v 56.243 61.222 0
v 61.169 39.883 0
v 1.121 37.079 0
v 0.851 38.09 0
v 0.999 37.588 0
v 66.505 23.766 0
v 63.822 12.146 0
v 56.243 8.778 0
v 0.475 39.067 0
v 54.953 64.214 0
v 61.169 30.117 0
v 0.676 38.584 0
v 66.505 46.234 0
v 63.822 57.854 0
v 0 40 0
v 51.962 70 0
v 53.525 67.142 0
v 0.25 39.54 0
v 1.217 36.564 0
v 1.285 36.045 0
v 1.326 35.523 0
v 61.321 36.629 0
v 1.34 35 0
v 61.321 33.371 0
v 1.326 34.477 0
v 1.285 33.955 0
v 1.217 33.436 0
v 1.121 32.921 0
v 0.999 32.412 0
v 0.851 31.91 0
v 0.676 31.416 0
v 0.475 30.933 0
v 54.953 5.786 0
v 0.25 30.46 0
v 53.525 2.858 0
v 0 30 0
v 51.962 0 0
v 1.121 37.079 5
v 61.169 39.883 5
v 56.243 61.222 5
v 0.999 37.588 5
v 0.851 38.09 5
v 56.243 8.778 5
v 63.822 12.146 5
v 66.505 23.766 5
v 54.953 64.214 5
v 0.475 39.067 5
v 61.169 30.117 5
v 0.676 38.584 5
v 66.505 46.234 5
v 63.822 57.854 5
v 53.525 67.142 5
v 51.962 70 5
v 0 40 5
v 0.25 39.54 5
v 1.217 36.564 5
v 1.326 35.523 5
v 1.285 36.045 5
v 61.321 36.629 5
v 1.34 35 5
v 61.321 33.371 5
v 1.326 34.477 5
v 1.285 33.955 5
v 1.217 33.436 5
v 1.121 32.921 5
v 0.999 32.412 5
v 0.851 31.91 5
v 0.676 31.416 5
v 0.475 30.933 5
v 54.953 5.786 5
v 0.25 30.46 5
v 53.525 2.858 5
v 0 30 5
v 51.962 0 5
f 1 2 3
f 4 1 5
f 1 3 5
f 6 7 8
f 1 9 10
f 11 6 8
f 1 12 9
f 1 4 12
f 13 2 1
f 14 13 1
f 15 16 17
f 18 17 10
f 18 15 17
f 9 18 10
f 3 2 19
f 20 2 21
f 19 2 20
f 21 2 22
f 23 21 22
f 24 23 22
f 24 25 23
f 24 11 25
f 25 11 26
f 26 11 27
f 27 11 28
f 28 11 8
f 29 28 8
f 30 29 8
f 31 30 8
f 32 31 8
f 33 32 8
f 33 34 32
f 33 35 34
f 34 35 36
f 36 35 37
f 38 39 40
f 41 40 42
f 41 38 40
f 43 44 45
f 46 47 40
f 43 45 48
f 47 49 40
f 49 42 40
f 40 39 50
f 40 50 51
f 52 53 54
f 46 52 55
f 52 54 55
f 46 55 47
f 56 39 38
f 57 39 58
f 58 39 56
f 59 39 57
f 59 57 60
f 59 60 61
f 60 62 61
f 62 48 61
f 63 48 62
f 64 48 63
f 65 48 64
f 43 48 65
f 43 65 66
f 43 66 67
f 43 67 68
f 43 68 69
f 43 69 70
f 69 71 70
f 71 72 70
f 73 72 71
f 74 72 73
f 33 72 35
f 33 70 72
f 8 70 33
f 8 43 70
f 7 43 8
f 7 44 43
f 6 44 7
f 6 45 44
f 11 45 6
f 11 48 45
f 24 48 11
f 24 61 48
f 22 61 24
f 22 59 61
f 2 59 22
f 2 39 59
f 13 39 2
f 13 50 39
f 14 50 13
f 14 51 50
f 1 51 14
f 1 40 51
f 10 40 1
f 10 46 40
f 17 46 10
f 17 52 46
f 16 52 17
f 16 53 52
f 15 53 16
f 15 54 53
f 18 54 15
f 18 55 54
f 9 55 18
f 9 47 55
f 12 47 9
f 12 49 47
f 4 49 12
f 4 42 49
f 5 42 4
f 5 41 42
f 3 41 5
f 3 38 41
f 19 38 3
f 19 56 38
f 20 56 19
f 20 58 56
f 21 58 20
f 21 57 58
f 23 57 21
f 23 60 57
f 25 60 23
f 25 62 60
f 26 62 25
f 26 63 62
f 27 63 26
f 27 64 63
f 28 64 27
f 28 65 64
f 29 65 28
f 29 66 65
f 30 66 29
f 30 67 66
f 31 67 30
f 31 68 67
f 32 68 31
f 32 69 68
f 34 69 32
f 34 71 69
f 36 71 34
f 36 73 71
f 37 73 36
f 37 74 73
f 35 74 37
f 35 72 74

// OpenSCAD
$fn = 32;

// ----------------------------------------------------------------------
// Gear sector: 2 teeth on 60 degrees
// ----------------------------------------------------------------------

// --- parameters (mm) ---
sector_angle = 60;        // sector angle, degrees
root_r = 70;              // root circle radius
tooth_h = 6;              // tooth height over the root circle
teeth = 2;                // number of teeth on the sector
hub_r = 10;               // hub bore radius
plate_t = 5;              // sector thickness, Z
arc_step = 3;             // sampling step of the root/hub arcs, degrees

tip_r = root_r + tooth_h;  // tip circle radius

profile = [[51.962, 0], [53.525, 2.858], [54.953, 5.786], [56.243, 8.778], [63.822, 12.146], [66.505, 23.766], [61.169, 30.117], [61.321, 33.371], [61.321, 36.629], [61.169, 39.883], [66.505, 46.234], [63.822, 57.854], [56.243, 61.222], [54.953, 64.214], [53.525, 67.142], [51.962, 70], [0, 40], [0.25, 39.54], [0.475, 39.067], [0.676, 38.584], [0.851, 38.09], [0.999, 37.588], [1.121, 37.079], [1.217, 36.564], [1.285, 36.045], [1.326, 35.523], [1.34, 35], [1.326, 34.477], [1.285, 33.955], [1.217, 33.436], [1.121, 32.921], [0.999, 32.412], [0.851, 31.91], [0.676, 31.416], [0.475, 30.933], [0.25, 30.46], [0, 30]];  // primary outline, 37 points, counter clockwise

// --- the one profile operation ---
linear_extrude(height = plate_t) polygon(points = profile);
